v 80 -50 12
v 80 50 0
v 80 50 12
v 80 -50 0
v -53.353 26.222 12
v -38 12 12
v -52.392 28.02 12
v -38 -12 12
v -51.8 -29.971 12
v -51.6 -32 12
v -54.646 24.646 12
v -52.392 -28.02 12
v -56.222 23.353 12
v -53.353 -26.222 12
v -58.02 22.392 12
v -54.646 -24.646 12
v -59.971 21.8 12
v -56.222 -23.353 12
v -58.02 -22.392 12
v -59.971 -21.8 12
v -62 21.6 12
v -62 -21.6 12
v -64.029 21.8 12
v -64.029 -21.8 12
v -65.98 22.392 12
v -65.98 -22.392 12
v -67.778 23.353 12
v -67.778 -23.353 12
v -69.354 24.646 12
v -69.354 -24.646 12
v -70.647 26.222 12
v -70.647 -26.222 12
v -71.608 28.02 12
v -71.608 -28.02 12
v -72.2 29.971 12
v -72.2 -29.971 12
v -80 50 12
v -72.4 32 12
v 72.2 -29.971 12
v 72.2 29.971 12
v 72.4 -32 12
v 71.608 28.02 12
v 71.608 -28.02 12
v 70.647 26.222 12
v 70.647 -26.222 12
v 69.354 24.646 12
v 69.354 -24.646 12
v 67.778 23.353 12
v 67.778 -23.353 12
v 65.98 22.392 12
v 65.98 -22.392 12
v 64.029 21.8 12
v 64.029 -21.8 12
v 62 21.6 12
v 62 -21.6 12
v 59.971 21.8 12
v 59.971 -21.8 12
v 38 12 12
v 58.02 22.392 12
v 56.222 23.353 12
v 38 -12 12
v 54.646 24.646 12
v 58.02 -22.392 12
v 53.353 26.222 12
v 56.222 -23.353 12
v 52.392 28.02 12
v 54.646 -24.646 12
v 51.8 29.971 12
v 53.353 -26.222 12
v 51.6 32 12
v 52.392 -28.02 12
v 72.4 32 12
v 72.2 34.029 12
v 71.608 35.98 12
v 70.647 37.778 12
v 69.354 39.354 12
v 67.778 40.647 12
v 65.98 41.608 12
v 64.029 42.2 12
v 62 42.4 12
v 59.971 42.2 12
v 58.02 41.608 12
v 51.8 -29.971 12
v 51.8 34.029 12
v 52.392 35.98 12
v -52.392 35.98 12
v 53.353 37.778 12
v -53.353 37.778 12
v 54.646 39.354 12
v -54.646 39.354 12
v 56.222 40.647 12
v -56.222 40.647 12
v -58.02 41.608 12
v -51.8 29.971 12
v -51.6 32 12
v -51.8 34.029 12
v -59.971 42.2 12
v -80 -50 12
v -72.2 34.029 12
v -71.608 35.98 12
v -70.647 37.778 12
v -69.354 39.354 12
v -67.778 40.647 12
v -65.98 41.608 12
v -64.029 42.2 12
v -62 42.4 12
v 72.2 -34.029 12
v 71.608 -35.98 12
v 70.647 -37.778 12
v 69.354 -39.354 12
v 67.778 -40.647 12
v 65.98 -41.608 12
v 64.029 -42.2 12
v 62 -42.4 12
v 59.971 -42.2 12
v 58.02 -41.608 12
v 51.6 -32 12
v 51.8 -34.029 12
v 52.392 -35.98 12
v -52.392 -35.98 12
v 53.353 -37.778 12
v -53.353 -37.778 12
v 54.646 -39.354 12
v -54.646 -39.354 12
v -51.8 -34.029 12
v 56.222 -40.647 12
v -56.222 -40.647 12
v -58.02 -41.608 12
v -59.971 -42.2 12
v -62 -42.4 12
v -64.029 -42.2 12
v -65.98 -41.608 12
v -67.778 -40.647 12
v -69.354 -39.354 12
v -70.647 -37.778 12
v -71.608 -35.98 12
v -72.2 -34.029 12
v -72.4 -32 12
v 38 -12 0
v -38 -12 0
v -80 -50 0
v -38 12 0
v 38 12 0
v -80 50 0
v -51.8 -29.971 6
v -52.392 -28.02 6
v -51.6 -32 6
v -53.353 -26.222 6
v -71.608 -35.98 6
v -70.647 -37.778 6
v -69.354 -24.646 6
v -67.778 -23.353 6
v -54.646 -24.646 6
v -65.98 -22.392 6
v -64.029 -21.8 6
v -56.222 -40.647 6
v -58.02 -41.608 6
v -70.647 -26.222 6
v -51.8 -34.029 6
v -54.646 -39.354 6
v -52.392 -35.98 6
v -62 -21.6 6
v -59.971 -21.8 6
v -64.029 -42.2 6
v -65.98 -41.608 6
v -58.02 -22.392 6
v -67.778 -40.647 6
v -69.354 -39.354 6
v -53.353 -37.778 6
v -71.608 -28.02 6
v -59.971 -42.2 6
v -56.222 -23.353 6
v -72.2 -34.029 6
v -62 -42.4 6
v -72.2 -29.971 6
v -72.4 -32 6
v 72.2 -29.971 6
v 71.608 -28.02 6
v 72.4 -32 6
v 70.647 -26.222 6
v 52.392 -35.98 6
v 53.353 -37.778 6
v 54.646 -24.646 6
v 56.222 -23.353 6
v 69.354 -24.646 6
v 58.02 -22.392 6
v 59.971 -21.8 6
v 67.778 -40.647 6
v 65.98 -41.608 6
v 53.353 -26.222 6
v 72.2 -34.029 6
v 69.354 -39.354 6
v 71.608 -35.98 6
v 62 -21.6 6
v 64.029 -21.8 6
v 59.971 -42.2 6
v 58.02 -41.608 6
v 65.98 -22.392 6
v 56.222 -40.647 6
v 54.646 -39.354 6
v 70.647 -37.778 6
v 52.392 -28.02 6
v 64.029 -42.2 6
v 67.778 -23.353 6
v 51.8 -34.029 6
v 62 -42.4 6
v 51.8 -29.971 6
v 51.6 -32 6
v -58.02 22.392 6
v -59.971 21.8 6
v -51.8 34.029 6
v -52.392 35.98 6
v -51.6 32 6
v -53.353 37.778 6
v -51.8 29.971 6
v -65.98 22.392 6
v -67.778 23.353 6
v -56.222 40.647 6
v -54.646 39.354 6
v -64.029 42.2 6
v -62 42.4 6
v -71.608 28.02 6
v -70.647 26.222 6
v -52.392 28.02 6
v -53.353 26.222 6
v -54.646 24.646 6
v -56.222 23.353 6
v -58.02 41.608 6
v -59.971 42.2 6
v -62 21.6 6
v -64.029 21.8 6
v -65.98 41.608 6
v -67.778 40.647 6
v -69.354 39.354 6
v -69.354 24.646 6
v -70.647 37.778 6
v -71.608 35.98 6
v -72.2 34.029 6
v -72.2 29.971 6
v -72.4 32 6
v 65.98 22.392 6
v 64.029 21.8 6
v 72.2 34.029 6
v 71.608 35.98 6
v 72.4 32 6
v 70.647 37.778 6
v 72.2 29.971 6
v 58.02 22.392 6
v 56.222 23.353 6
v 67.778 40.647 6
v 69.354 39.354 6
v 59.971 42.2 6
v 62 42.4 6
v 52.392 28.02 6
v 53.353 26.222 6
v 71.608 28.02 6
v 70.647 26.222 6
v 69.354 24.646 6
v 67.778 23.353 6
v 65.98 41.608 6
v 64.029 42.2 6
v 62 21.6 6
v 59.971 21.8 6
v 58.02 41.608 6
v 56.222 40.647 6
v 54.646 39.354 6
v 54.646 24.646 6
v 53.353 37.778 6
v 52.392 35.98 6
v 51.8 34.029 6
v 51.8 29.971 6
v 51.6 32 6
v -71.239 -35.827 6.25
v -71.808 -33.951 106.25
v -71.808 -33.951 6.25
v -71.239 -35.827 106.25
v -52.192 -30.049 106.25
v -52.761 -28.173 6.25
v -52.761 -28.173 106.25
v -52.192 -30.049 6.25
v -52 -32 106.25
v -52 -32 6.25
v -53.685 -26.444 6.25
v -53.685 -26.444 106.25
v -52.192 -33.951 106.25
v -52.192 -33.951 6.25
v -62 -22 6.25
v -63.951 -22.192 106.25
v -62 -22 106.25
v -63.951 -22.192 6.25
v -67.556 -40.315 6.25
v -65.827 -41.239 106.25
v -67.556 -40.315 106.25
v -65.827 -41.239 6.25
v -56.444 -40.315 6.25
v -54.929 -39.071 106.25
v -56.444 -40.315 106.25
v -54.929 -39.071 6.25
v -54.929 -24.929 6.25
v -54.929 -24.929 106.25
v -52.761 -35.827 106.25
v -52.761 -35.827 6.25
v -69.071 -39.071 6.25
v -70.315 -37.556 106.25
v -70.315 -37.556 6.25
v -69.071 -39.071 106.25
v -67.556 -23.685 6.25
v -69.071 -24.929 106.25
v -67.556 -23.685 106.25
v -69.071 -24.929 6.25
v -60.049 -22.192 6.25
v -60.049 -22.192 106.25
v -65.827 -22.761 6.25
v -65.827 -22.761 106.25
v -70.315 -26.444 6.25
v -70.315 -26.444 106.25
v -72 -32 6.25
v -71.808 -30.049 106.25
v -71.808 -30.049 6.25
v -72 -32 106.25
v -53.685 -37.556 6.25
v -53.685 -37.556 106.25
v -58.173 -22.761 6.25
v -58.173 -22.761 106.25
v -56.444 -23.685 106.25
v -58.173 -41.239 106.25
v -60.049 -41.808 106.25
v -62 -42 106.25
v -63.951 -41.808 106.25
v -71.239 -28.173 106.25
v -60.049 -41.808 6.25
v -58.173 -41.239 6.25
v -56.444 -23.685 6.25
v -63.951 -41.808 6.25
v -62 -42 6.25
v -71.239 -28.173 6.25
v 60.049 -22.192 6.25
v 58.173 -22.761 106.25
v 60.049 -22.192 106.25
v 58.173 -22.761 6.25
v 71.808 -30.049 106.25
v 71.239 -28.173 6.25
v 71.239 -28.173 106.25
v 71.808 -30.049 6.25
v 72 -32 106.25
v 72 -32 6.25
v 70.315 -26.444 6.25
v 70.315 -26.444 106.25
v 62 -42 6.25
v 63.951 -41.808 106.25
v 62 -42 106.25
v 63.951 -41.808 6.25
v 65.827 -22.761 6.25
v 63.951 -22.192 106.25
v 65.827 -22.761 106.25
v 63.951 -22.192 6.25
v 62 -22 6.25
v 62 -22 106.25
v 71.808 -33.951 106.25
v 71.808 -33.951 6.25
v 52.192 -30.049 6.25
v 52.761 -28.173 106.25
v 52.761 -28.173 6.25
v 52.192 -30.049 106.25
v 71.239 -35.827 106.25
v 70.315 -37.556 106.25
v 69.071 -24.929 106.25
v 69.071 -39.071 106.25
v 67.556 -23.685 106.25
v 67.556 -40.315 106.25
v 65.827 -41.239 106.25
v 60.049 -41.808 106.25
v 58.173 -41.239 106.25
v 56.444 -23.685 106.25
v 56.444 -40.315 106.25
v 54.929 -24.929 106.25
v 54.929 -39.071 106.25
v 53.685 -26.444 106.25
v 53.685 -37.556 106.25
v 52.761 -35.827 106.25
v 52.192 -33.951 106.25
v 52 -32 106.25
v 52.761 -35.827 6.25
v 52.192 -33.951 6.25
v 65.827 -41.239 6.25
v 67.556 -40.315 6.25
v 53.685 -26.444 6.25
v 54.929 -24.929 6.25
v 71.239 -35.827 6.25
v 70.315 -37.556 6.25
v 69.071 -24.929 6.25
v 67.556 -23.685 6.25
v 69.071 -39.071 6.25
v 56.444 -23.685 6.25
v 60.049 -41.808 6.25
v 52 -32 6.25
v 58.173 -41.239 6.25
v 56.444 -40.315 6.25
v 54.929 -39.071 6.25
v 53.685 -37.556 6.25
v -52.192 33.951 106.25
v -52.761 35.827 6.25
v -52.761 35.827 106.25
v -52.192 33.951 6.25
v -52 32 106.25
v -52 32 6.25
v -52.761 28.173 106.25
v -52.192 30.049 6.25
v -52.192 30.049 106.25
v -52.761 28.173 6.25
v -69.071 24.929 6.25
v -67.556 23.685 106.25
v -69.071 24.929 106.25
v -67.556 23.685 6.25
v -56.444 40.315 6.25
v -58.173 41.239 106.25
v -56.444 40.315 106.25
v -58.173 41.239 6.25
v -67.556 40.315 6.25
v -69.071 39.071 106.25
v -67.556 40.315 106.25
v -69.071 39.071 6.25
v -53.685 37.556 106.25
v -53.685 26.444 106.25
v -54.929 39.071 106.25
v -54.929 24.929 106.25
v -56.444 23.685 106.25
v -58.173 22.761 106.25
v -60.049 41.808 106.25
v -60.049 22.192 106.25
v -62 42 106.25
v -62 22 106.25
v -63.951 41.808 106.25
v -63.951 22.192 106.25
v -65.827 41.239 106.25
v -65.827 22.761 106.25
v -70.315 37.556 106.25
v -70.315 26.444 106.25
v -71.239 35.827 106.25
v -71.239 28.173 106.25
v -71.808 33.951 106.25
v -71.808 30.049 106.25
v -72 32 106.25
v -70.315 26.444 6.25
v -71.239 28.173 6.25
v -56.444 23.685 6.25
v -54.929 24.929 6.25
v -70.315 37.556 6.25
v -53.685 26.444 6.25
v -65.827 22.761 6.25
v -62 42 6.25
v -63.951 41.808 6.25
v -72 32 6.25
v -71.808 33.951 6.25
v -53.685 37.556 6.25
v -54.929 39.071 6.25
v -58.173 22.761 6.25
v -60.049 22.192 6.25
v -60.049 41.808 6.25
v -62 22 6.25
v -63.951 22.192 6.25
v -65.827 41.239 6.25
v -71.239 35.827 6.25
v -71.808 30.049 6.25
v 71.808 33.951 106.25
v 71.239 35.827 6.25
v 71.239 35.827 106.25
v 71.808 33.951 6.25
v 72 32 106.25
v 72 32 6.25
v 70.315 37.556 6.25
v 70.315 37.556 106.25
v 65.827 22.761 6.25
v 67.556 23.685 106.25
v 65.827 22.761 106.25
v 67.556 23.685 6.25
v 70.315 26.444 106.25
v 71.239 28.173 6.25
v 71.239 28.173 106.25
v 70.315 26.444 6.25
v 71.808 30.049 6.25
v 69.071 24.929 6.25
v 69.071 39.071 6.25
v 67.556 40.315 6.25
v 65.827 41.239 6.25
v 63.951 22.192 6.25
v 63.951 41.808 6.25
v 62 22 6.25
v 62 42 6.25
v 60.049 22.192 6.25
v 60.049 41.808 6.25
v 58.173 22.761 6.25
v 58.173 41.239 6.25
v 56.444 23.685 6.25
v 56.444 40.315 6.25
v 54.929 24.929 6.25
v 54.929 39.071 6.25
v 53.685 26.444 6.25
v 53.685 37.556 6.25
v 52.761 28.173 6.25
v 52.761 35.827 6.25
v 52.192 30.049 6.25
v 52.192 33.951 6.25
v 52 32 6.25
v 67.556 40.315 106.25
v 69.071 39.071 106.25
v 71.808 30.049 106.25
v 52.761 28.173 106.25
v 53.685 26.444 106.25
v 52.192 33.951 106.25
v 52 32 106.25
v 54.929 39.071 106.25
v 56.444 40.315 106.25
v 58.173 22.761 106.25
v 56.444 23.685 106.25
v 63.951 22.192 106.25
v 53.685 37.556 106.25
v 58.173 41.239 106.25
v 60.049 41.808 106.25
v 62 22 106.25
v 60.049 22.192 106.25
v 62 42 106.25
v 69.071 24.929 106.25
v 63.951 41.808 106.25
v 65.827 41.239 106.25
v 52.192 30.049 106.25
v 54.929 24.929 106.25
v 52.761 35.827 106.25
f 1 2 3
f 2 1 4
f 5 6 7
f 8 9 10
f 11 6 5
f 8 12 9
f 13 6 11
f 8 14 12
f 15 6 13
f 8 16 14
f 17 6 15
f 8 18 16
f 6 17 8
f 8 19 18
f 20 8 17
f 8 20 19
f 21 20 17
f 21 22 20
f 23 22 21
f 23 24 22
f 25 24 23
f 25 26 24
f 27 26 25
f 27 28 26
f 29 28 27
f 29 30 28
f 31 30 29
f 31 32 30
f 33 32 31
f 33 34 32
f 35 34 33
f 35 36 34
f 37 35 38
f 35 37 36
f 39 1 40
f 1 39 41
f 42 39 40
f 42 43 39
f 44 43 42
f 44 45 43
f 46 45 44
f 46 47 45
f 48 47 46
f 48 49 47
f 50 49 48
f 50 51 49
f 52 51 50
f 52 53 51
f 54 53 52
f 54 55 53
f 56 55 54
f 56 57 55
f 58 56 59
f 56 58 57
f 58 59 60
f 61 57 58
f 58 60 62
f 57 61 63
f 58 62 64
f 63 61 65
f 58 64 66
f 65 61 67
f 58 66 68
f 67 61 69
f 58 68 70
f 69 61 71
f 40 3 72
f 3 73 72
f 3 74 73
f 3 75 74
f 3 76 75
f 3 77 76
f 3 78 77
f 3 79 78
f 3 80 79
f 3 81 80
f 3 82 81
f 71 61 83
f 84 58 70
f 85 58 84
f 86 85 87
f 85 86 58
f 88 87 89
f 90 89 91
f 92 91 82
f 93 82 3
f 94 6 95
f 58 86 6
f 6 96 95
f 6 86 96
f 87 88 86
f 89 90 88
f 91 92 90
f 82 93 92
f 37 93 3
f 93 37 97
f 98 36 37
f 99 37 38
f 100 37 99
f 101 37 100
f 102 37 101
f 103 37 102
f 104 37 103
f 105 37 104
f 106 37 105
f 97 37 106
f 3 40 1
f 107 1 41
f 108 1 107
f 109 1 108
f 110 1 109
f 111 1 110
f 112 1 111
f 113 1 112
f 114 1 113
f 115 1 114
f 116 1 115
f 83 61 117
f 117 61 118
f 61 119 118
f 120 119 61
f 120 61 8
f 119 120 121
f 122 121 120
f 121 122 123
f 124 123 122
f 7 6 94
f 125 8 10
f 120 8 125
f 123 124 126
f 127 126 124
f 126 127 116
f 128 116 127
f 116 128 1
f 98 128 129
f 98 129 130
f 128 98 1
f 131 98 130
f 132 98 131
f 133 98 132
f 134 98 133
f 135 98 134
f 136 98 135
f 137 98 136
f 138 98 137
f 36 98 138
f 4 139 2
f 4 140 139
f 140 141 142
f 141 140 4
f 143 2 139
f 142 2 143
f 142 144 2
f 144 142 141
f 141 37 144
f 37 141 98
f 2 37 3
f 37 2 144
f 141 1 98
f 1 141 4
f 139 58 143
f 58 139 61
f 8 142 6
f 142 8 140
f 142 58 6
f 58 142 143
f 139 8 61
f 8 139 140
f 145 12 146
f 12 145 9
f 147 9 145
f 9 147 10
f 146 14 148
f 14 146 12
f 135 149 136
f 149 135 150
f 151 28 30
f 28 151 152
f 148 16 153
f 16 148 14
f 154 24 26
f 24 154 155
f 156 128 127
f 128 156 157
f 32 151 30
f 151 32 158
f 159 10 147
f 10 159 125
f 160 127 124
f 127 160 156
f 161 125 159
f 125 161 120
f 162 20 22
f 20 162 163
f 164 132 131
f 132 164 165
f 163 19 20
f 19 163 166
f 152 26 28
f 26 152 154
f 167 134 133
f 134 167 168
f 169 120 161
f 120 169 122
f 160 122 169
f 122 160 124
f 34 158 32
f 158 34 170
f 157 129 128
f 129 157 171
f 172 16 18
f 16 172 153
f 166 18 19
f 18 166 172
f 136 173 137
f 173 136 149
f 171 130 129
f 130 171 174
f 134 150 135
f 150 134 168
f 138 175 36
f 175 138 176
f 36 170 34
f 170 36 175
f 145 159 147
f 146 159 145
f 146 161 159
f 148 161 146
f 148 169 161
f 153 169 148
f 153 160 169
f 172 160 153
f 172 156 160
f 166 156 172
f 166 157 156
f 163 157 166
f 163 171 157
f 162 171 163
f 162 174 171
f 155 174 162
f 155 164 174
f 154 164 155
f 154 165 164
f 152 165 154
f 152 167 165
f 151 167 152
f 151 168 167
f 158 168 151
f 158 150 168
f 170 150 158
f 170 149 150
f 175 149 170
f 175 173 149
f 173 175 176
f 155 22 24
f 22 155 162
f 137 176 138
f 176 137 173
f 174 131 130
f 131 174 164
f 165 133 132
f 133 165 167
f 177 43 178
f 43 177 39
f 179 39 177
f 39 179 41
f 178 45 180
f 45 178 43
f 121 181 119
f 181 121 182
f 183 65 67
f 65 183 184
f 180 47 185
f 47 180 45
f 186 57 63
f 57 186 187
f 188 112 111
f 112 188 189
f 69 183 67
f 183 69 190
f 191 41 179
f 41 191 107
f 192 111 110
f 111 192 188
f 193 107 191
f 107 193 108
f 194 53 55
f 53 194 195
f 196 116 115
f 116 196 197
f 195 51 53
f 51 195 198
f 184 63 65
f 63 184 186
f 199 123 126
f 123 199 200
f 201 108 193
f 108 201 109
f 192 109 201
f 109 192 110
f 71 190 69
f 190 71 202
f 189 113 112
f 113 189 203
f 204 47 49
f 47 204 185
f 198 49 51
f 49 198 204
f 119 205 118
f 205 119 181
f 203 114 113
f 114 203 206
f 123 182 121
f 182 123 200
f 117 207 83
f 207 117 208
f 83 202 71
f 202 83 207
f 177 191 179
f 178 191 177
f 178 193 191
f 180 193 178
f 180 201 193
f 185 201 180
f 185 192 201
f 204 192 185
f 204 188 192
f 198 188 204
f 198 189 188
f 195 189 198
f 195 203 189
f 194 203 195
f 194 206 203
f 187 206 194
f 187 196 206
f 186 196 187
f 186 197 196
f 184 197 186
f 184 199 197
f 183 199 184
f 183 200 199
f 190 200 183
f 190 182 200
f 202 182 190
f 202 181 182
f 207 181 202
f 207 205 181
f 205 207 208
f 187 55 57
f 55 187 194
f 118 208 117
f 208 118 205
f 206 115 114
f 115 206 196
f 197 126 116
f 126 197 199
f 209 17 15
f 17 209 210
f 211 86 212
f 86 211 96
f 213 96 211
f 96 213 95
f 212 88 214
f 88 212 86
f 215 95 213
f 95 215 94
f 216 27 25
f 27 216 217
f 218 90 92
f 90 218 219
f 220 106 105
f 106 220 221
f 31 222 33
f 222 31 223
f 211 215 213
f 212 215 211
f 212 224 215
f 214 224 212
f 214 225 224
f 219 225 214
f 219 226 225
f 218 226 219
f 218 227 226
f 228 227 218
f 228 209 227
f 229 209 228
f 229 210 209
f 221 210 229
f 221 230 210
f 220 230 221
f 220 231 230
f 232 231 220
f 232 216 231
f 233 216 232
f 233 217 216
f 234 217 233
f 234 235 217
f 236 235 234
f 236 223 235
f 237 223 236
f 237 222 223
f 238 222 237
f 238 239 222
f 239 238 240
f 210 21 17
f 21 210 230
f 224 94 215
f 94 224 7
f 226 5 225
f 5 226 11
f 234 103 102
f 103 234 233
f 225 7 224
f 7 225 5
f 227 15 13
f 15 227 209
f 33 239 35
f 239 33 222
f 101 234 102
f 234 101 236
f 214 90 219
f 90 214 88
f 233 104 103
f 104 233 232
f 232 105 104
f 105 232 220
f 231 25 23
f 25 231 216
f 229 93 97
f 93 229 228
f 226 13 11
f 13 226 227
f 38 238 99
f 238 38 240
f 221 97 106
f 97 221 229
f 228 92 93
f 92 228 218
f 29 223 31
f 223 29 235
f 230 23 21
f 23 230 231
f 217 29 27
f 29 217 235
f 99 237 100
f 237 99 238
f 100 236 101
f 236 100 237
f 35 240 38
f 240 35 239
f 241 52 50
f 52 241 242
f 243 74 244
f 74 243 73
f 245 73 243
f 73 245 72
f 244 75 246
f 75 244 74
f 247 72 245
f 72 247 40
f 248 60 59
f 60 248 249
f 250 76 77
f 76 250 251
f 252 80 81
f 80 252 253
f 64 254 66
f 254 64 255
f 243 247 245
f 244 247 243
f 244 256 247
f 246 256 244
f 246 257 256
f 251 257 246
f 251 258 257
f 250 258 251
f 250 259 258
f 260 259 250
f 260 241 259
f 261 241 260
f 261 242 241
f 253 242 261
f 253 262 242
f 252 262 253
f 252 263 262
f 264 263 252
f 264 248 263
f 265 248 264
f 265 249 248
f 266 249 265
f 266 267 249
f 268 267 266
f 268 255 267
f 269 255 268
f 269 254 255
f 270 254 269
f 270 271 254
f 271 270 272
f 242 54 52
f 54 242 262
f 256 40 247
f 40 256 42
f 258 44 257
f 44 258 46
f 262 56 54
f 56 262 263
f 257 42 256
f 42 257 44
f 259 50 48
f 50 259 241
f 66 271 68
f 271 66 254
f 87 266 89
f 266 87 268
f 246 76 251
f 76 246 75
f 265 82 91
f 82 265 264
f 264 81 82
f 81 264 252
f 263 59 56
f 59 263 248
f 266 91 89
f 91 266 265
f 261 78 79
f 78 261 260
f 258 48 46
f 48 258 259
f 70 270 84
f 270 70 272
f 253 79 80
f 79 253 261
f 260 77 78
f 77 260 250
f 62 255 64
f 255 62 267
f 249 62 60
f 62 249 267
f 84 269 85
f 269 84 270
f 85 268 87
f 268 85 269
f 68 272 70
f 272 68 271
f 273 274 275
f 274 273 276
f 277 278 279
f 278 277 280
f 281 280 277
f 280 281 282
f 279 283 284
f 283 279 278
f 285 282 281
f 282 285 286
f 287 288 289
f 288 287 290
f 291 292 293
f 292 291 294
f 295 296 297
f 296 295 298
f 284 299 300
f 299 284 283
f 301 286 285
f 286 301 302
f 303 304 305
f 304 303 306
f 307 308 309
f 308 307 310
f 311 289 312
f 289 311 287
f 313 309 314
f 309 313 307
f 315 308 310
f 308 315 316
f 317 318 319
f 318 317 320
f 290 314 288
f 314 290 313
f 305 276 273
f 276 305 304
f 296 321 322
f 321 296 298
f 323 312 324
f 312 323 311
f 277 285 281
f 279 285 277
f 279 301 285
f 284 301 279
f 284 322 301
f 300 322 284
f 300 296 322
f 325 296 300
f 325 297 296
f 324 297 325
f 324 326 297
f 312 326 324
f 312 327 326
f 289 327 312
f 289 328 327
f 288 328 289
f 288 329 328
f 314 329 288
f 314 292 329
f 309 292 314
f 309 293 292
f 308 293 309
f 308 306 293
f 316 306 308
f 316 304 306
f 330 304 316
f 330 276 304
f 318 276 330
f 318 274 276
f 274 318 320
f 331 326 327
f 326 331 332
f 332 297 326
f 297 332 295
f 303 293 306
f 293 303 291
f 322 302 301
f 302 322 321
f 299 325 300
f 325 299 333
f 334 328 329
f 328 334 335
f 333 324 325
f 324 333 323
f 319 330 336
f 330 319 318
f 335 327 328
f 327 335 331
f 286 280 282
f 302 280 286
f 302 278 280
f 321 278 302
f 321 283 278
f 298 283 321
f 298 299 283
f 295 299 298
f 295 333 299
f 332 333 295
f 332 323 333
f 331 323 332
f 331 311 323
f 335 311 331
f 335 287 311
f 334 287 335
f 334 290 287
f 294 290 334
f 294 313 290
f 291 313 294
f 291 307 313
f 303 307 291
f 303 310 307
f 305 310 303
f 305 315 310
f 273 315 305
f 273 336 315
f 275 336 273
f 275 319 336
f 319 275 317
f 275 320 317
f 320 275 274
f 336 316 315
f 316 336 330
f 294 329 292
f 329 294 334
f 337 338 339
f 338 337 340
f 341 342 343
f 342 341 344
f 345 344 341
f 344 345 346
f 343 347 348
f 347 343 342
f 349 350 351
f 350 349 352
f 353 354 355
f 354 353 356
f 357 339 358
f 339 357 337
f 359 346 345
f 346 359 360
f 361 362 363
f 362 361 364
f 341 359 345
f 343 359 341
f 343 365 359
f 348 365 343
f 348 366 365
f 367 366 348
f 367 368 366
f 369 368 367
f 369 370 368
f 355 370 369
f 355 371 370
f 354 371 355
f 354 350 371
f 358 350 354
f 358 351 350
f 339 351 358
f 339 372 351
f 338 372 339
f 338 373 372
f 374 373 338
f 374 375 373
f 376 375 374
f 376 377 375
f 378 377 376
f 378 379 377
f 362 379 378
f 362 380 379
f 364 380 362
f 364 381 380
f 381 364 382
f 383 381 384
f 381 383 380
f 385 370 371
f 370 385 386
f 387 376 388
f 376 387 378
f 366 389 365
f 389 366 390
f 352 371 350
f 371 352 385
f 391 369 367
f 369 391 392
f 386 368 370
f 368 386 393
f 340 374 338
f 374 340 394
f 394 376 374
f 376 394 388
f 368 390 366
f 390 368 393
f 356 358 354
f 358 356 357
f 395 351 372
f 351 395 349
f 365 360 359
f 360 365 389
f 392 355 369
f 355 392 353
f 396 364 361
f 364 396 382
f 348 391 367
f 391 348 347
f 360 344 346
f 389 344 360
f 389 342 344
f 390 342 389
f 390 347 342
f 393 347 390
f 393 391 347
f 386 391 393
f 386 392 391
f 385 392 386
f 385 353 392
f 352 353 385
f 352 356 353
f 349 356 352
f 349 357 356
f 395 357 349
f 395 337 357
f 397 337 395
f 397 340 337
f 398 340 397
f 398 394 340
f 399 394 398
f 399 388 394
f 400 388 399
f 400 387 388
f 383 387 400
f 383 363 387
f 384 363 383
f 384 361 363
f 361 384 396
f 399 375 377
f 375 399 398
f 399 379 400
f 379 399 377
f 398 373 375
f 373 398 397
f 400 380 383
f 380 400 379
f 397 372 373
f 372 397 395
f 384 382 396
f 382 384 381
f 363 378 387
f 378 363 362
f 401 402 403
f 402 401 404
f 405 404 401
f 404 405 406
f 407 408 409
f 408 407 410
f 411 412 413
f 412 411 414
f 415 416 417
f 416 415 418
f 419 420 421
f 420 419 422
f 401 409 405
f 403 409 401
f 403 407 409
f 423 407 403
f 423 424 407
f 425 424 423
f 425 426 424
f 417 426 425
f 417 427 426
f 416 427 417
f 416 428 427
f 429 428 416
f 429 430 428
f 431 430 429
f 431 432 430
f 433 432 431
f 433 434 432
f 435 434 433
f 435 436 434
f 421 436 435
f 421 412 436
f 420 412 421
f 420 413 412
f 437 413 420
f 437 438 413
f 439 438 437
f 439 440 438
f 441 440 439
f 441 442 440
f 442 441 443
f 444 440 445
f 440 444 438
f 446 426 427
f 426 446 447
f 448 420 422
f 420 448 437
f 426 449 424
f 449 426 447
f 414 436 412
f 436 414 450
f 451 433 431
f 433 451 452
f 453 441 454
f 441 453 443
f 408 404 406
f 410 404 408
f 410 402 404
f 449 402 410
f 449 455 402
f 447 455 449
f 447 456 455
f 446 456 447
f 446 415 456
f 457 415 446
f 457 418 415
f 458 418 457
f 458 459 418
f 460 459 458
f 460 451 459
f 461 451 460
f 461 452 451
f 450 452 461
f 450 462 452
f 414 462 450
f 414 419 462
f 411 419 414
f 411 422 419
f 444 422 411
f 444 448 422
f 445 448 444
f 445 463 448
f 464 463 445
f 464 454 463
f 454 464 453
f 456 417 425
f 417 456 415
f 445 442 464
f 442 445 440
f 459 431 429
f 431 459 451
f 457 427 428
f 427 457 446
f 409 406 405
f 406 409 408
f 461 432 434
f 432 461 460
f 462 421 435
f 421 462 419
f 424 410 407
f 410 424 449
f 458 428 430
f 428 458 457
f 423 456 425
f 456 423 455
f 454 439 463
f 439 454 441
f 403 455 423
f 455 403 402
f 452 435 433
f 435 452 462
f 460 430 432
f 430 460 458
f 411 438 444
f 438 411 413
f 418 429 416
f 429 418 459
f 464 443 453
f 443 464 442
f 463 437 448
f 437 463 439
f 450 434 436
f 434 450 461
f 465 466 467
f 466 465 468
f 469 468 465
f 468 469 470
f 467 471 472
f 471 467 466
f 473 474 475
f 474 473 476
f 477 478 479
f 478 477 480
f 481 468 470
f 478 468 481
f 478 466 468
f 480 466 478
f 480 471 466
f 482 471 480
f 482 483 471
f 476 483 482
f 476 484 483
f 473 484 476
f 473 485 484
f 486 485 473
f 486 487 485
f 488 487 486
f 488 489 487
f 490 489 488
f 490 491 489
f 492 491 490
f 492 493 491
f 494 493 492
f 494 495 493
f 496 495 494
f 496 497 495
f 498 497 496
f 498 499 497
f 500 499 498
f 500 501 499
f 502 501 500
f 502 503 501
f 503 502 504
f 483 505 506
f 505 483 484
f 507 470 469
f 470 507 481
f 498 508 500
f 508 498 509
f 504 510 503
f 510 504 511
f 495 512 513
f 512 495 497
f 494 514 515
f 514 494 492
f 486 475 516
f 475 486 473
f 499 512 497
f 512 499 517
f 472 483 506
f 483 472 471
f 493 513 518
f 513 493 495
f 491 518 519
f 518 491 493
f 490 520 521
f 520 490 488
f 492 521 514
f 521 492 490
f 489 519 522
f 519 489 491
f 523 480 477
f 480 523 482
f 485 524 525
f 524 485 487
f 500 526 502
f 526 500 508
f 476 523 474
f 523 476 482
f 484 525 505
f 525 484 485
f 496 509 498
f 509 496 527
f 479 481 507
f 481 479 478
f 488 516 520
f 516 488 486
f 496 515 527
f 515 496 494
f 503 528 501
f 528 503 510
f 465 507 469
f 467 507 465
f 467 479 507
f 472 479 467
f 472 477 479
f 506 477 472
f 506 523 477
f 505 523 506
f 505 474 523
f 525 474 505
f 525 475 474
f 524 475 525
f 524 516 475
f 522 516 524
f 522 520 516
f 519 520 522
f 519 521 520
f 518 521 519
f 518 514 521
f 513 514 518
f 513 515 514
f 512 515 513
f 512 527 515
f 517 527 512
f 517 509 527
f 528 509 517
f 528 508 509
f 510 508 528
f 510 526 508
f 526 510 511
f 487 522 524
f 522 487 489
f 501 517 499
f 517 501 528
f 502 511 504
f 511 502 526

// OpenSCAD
$fn = 32;

// ------------------------------------------------------------------------
// Frame with four posts: 160 x 100 mm frame, four d20 posts
// Every part is its own module, assembly() places them once.
// ------------------------------------------------------------------------

// --- part 1 ---
module base_frame() {
  difference() {
    translate([-80, -50, 0]) cube([160, 100, 12]);
    translate([-38, -12, -1]) cube([76, 24, 14]);
    translate([-62, -32, 6]) cylinder(h = 7, d = 20.8);
    translate([62, -32, 6]) cylinder(h = 7, d = 20.8);
    translate([-62, 32, 6]) cylinder(h = 7, d = 20.8);
    translate([62, 32, 6]) cylinder(h = 7, d = 20.8);
  }
}

// --- part 2 ---
module post1() {
  cylinder(h = 100, d = 20);
}

// --- part 3 ---
module post2() {
  cylinder(h = 100, d = 20);
}

// --- part 4 ---
module post3() {
  cylinder(h = 100, d = 20);
}

// --- part 5 ---
module post4() {
  cylinder(h = 100, d = 20);
}

// --- assembly ---
module assembly() {
  translate([0, 0, 0]) rotate([0, 0, 0]) base_frame();
  translate([-62, -32, 6.25]) rotate([0, 0, 0]) post1();
  translate([62, -32, 6.25]) rotate([0, 0, 0]) post2();
  translate([-62, 32, 6.25]) rotate([0, 0, 0]) post3();
  translate([62, 32, 6.25]) rotate([0, 0, 0]) post4();
}

assembly();
